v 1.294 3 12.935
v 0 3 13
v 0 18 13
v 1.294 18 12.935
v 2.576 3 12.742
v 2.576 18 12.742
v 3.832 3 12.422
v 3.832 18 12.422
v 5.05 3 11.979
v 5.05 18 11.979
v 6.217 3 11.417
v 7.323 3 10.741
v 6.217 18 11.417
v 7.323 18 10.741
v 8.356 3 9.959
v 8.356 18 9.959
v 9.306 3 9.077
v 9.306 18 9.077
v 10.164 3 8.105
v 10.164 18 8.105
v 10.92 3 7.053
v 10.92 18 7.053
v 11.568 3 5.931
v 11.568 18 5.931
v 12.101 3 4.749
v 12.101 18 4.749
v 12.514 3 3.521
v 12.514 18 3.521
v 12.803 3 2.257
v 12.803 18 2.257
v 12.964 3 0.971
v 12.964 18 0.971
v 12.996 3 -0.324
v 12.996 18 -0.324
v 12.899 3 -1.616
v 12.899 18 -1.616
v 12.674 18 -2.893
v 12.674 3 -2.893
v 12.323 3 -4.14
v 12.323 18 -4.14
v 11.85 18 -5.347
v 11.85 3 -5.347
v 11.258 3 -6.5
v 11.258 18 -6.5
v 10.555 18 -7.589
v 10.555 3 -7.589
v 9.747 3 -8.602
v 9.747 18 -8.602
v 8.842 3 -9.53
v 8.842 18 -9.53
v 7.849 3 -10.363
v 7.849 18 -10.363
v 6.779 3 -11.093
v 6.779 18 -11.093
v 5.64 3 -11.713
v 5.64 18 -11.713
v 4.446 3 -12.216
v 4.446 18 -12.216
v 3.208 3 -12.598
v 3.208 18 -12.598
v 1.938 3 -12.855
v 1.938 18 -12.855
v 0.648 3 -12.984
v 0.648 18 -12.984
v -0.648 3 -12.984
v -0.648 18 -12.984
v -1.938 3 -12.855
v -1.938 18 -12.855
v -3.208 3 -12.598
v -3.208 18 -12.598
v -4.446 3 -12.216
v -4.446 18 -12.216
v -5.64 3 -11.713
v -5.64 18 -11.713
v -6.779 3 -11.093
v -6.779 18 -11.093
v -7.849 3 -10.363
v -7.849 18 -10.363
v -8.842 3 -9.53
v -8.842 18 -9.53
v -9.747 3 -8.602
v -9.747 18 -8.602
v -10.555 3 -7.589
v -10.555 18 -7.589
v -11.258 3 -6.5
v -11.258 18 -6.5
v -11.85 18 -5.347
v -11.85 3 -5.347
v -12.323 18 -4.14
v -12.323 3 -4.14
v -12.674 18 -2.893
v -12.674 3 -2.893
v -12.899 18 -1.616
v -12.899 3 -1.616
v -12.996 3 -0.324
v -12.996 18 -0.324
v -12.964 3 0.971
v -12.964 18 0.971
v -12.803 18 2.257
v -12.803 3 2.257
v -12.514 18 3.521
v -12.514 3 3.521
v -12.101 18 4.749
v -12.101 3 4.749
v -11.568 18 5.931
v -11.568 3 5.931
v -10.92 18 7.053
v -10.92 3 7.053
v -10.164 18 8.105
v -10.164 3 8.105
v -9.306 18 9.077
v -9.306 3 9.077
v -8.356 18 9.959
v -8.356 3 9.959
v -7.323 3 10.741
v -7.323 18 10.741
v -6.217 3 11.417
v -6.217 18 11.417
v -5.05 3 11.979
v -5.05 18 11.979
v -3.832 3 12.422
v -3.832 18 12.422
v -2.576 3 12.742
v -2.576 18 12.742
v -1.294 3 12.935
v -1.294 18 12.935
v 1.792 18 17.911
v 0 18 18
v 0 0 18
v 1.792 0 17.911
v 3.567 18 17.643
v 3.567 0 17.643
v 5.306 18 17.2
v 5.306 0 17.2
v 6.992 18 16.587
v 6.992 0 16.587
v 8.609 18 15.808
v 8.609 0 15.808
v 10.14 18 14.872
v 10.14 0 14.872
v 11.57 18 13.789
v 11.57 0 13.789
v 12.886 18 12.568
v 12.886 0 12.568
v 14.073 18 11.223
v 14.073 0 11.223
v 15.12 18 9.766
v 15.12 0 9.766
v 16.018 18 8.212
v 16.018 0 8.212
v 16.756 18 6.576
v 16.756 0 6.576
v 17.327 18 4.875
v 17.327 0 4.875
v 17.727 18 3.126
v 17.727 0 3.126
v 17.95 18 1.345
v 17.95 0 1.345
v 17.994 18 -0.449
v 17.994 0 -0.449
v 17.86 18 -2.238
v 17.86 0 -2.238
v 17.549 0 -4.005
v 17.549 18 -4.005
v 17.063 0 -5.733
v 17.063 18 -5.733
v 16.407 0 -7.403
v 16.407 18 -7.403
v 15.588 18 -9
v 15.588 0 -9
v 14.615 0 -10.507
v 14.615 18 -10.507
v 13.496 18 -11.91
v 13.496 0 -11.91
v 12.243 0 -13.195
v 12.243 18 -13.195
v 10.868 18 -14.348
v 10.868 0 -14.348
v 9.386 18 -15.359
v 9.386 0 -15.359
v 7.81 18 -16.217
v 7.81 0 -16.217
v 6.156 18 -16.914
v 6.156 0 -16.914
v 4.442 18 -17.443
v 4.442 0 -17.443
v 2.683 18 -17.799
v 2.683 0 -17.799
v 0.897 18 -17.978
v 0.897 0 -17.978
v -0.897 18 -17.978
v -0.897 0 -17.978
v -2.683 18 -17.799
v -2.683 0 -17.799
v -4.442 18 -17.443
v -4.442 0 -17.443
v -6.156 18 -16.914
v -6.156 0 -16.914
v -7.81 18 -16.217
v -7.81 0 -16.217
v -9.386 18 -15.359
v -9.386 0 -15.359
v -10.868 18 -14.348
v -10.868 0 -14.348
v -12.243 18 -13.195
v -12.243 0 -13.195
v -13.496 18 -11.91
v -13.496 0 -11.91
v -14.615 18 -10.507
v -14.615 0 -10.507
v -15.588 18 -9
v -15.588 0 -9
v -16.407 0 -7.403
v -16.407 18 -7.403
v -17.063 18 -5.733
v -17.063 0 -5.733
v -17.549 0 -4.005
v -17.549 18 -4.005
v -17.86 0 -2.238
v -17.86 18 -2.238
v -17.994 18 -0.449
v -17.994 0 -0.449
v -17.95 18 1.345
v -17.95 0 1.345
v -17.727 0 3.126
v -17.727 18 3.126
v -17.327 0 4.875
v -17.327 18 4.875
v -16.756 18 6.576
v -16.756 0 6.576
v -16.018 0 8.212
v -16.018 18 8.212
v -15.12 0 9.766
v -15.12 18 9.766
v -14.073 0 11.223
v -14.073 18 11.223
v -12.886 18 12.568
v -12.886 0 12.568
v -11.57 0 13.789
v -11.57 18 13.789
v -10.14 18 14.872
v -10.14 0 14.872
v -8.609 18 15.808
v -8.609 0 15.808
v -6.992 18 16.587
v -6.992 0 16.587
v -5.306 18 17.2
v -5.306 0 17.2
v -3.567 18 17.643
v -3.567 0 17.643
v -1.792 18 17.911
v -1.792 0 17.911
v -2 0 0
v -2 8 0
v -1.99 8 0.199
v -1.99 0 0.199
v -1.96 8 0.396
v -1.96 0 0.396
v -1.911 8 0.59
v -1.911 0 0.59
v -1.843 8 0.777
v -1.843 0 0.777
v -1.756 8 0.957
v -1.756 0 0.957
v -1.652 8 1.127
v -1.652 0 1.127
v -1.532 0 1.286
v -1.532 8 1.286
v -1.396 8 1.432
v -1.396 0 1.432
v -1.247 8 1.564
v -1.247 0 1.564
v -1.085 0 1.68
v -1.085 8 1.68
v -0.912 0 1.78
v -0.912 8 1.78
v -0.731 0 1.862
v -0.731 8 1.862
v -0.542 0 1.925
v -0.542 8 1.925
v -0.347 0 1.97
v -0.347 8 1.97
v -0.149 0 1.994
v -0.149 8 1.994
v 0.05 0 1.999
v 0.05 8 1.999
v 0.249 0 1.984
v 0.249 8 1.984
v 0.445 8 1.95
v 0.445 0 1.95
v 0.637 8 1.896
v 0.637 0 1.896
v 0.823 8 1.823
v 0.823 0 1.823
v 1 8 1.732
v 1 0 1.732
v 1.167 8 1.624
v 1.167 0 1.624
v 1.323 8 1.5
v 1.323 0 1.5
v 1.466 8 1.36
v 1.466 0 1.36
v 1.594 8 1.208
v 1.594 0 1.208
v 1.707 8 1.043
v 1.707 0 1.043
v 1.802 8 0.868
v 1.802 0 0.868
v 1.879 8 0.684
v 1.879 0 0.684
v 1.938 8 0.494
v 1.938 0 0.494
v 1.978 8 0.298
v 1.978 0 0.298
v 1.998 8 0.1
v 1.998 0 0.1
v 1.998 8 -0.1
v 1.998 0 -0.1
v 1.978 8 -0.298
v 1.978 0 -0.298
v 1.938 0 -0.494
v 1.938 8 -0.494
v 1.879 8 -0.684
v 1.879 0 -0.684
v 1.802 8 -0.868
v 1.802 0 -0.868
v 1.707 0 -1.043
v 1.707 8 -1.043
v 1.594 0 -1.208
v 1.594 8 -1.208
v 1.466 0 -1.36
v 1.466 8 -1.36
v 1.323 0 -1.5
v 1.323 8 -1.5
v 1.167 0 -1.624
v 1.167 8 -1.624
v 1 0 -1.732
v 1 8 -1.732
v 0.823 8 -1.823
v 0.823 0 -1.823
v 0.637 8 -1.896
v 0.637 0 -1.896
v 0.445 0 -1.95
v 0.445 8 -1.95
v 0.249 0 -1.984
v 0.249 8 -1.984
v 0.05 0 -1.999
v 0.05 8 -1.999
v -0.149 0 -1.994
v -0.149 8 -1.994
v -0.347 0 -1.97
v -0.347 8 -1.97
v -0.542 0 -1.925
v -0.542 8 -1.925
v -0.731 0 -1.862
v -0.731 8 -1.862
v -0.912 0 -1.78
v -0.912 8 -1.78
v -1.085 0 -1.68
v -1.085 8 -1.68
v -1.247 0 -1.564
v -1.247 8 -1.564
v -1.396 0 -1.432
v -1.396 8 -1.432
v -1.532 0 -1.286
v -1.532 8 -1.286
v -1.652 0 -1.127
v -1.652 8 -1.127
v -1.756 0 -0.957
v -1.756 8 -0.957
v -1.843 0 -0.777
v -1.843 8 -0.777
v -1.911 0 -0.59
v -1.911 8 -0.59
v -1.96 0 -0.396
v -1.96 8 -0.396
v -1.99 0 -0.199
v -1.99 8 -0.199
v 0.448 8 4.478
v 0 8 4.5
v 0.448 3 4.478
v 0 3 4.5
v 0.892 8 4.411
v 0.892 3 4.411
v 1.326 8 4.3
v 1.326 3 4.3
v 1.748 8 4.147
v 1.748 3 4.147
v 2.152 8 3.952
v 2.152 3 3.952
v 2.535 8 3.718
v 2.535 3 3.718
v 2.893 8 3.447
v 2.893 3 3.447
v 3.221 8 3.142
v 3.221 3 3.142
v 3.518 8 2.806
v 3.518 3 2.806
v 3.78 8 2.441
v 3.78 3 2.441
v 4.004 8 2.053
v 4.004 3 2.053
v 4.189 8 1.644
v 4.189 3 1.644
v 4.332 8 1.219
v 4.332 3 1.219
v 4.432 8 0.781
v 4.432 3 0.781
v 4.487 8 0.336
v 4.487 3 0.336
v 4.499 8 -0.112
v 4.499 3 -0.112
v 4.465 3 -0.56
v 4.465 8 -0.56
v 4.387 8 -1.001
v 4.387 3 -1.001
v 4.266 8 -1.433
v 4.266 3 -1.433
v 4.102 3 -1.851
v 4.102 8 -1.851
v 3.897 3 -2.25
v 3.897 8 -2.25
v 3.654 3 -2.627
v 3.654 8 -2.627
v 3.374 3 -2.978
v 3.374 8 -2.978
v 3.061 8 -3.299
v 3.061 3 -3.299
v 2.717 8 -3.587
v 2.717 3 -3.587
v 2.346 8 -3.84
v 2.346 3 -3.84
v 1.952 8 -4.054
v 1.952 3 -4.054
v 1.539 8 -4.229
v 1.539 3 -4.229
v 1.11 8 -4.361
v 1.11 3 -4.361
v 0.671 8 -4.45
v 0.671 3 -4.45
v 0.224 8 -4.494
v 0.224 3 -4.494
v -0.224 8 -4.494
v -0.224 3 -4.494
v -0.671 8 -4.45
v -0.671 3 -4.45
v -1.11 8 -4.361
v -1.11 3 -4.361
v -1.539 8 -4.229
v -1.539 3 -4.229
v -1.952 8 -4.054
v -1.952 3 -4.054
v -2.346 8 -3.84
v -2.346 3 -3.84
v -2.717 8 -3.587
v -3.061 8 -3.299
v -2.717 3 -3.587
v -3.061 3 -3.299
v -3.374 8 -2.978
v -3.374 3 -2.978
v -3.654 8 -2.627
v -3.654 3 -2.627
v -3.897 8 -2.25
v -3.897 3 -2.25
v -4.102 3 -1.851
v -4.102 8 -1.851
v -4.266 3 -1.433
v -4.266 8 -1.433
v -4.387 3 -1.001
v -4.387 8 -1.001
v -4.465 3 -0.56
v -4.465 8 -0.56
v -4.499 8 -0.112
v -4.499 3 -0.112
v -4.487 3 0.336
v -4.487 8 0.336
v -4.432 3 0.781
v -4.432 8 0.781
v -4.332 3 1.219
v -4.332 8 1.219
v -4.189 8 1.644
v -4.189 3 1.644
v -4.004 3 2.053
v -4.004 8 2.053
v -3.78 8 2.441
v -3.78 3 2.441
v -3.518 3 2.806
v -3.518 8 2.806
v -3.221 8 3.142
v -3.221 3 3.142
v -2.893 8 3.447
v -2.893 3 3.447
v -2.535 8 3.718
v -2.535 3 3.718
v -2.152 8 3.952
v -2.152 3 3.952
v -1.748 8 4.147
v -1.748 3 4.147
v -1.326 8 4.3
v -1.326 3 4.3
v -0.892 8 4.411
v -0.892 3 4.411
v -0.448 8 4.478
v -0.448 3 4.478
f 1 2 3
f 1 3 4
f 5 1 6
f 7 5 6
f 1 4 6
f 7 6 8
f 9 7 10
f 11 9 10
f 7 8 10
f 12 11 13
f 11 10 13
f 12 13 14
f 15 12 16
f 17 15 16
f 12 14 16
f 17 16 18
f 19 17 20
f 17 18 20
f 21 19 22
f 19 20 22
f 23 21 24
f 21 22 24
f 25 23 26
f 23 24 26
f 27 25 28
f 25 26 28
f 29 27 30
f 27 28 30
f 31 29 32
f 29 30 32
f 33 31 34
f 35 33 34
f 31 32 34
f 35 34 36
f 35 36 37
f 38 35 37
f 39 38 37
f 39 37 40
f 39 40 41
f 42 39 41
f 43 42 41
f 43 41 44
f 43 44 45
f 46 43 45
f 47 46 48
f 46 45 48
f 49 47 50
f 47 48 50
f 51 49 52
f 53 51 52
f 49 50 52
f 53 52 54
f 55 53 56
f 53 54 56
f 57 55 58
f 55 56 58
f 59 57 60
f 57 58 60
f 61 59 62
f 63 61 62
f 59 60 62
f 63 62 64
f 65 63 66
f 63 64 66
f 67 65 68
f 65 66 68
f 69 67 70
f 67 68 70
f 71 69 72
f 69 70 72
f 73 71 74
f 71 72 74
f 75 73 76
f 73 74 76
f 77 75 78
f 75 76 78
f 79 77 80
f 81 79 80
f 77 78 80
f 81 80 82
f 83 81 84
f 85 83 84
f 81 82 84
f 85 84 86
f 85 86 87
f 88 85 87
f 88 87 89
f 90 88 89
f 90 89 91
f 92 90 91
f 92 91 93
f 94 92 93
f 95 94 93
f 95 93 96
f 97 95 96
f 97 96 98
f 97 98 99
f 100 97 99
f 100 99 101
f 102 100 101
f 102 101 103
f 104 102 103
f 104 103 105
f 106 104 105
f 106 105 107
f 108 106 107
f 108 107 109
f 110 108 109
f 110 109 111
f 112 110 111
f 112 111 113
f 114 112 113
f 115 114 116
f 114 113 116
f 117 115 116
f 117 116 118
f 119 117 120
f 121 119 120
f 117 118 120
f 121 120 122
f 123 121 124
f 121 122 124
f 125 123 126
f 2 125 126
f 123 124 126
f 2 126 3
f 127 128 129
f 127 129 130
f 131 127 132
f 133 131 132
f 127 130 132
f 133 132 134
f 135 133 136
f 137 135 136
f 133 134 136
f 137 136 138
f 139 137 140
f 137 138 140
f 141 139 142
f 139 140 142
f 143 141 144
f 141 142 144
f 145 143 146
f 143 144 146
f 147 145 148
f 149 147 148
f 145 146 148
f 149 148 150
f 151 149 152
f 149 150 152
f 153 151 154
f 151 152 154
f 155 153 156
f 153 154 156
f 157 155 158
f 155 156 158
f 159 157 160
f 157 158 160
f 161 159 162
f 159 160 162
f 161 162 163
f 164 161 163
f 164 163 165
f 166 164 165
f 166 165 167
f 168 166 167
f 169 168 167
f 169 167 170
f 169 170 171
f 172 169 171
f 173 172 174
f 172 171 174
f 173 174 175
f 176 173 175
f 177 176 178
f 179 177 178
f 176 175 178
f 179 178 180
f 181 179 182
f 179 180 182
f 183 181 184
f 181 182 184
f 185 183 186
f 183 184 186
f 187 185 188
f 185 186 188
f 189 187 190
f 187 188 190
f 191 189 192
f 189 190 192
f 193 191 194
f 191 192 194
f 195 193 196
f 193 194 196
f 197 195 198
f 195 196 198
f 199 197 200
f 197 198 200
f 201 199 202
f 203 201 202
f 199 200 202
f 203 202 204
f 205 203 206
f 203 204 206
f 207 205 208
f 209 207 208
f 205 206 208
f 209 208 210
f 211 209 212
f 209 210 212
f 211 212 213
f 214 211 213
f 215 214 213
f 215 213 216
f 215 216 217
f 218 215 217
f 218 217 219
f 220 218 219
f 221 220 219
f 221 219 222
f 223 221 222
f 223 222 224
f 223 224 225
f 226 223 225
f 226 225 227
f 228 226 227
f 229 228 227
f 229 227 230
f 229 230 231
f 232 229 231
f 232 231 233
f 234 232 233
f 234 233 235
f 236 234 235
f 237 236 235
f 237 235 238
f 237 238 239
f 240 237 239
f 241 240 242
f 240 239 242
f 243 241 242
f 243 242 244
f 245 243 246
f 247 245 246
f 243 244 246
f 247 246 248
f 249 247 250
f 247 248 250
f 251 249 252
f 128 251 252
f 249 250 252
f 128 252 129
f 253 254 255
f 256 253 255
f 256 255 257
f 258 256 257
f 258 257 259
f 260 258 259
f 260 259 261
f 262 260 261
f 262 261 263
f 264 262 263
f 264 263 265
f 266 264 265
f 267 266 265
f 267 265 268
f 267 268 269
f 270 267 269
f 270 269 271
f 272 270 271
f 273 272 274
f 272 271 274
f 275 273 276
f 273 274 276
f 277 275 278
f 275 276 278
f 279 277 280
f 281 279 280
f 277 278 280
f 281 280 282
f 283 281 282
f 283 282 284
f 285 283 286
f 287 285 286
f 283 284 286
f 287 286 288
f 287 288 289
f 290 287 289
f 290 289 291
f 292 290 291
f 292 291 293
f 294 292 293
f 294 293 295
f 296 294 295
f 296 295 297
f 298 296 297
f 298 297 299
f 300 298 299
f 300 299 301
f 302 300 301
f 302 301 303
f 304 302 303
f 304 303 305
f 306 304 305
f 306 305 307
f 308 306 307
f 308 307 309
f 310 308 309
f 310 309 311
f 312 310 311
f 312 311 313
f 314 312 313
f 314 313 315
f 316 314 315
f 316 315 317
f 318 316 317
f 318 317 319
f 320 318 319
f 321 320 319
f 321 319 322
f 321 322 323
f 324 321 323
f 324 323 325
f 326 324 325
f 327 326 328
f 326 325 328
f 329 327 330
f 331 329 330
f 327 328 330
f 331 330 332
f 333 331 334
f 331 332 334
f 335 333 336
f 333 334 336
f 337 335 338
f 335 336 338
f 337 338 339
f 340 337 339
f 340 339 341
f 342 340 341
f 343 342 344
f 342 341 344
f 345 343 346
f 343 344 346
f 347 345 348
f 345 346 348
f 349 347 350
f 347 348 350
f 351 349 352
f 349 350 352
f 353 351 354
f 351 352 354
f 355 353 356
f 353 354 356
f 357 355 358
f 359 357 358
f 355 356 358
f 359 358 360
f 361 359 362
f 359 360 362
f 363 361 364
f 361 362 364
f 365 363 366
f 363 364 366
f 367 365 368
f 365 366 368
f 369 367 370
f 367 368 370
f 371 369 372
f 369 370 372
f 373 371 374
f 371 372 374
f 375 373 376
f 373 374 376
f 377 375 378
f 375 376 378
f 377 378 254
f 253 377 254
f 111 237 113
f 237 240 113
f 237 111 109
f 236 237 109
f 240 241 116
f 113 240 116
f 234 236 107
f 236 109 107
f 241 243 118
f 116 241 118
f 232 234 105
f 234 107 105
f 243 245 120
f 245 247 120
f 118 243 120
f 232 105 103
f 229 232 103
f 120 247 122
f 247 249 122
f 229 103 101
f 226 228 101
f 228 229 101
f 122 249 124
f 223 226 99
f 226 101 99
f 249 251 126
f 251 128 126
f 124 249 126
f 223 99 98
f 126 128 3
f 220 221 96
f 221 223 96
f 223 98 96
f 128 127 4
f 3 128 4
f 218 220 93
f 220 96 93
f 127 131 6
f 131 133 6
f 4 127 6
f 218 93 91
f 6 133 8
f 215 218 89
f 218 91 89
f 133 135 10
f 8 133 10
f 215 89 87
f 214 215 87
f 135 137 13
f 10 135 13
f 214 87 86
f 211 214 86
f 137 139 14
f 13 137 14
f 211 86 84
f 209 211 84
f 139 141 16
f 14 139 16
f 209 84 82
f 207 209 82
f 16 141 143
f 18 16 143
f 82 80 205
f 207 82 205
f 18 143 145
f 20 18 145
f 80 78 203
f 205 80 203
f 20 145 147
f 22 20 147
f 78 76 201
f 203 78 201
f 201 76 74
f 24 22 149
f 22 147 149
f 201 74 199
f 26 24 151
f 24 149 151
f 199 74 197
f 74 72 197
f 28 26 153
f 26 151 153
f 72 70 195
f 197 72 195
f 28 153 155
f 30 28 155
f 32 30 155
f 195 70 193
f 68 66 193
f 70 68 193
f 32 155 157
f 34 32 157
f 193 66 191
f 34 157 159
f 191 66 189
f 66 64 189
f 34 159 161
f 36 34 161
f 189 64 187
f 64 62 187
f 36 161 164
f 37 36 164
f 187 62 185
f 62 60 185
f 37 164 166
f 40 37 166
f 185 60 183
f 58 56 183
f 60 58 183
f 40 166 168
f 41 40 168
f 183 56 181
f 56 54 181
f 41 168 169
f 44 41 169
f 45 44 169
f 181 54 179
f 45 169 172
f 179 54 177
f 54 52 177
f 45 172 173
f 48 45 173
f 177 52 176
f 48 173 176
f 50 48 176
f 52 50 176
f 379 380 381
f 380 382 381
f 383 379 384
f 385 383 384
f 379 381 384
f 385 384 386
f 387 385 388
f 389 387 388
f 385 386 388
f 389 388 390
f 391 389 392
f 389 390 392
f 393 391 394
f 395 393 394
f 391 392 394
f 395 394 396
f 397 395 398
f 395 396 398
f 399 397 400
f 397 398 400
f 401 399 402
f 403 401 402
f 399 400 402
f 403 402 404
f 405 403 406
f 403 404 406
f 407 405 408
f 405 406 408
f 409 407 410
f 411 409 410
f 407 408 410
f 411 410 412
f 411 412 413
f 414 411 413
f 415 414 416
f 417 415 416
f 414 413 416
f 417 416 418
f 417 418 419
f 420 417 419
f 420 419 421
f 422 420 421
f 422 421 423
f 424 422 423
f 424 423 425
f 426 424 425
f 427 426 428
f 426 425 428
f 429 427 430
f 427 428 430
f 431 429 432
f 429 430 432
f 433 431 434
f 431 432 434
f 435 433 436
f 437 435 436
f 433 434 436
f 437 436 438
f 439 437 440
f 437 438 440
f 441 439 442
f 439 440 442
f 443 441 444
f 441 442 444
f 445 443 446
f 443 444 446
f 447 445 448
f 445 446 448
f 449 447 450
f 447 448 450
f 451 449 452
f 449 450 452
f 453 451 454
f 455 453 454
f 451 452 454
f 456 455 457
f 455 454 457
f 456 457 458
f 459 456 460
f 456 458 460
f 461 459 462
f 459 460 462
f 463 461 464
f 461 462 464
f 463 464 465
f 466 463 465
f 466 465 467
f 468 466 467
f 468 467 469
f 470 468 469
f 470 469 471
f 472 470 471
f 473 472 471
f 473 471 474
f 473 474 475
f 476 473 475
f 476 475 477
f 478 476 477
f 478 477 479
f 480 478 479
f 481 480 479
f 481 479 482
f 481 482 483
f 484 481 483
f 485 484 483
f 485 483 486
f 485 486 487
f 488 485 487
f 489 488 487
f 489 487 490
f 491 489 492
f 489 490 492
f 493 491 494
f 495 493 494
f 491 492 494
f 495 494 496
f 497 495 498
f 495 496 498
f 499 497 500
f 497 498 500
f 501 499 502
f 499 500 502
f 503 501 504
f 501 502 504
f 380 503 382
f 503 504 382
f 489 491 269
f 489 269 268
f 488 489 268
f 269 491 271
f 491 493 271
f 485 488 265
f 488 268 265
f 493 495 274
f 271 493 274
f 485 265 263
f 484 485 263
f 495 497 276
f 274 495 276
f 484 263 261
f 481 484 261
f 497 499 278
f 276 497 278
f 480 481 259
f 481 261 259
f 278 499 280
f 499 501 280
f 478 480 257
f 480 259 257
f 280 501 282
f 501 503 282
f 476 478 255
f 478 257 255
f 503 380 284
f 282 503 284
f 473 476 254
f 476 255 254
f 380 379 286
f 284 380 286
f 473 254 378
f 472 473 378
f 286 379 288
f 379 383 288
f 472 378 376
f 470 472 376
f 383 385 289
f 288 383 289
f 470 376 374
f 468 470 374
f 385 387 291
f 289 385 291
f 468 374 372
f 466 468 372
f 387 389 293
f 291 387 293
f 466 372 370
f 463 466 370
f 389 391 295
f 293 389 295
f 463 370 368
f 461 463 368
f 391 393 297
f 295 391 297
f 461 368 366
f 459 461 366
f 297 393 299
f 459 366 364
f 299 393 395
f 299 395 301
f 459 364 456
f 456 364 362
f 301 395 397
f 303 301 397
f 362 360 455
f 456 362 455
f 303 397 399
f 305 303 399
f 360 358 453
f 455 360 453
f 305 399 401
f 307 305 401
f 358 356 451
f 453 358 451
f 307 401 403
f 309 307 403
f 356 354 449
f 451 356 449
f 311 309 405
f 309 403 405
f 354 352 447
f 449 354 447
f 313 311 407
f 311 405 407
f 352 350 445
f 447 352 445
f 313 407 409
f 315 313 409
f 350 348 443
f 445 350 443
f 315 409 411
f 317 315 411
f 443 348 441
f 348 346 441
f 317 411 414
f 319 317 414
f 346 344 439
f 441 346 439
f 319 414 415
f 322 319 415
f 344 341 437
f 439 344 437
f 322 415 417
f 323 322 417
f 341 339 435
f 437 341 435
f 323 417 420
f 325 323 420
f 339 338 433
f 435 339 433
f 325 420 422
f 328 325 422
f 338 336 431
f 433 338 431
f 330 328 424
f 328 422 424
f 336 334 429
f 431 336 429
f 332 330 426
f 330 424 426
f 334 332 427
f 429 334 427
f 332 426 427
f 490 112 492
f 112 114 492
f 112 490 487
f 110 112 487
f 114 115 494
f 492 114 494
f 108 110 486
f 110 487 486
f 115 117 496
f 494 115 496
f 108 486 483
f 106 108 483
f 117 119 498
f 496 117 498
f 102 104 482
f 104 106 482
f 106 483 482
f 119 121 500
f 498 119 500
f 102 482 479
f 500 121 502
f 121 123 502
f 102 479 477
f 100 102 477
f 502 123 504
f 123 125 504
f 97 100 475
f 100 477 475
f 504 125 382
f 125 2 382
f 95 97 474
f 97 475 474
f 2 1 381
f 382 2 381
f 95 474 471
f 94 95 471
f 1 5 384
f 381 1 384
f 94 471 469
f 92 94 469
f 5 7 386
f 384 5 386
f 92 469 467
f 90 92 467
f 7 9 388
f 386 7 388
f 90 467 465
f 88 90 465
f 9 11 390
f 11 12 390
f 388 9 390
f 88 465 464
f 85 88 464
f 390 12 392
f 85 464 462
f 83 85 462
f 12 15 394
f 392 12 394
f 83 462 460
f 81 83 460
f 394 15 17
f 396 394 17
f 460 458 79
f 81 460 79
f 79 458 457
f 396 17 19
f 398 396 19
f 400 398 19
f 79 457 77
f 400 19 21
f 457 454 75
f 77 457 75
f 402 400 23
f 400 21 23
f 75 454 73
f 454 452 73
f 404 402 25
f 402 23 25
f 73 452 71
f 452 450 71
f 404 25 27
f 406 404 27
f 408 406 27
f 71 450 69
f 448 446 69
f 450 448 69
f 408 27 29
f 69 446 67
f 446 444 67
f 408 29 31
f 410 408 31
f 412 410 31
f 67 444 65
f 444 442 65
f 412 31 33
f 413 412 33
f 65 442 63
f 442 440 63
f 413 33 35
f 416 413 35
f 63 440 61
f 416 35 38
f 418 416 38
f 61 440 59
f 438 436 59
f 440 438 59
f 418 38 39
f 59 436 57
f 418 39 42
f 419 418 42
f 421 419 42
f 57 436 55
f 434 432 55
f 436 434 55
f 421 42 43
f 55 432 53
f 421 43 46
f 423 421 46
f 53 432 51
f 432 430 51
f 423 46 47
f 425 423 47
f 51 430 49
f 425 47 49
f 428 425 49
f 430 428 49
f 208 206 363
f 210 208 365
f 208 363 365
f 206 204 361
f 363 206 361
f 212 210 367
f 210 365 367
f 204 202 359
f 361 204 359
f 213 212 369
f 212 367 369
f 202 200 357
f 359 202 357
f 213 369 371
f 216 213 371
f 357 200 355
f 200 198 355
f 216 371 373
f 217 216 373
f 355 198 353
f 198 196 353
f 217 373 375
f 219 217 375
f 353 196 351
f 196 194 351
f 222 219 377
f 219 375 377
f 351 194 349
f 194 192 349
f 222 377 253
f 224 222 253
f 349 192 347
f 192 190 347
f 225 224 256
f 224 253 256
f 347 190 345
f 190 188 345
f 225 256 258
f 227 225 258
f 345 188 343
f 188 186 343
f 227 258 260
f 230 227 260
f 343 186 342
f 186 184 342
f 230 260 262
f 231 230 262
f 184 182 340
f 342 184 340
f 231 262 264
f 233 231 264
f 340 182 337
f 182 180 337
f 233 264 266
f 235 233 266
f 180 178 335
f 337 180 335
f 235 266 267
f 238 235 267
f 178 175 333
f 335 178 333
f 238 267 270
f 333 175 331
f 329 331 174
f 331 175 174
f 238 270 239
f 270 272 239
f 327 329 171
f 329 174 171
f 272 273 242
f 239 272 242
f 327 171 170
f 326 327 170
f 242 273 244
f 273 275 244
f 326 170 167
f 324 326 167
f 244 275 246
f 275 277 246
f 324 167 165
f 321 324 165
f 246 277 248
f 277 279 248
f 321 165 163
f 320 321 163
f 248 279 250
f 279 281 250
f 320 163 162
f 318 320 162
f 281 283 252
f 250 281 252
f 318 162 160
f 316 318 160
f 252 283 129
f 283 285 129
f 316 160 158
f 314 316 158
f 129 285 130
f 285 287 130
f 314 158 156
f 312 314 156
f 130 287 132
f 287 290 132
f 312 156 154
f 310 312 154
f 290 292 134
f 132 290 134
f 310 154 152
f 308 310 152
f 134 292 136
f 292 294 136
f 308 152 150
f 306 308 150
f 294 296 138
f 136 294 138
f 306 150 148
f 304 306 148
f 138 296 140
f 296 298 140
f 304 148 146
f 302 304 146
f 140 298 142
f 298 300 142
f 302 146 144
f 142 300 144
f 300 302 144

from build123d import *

# Parameters (mm, degrees)
F3_R     = 2
F4_DEPTH = 25


with BuildPart() as f2:
    # F0 (on Right) → F2 (revolve)
    with BuildSketch(Plane.YZ):
        Polygon((0, 18), (0, 0), (8, 0), (8, 4.5), (3, 4.5), (3, 13), (18, 13), (18, 18), align=None)
    revolve(axis=Axis((0, -0.950184, 0), (0, 1, 0)))

    # F3 (on face) → F4 (cut)
    with BuildSketch(Plane(origin=(0, 8, 0), x_dir=(-1, 0, 0), z_dir=(0, 1, 0))):
        Circle(F3_R)
    extrude(amount=-F4_DEPTH, mode=Mode.SUBTRACT)


solid = f2.part
